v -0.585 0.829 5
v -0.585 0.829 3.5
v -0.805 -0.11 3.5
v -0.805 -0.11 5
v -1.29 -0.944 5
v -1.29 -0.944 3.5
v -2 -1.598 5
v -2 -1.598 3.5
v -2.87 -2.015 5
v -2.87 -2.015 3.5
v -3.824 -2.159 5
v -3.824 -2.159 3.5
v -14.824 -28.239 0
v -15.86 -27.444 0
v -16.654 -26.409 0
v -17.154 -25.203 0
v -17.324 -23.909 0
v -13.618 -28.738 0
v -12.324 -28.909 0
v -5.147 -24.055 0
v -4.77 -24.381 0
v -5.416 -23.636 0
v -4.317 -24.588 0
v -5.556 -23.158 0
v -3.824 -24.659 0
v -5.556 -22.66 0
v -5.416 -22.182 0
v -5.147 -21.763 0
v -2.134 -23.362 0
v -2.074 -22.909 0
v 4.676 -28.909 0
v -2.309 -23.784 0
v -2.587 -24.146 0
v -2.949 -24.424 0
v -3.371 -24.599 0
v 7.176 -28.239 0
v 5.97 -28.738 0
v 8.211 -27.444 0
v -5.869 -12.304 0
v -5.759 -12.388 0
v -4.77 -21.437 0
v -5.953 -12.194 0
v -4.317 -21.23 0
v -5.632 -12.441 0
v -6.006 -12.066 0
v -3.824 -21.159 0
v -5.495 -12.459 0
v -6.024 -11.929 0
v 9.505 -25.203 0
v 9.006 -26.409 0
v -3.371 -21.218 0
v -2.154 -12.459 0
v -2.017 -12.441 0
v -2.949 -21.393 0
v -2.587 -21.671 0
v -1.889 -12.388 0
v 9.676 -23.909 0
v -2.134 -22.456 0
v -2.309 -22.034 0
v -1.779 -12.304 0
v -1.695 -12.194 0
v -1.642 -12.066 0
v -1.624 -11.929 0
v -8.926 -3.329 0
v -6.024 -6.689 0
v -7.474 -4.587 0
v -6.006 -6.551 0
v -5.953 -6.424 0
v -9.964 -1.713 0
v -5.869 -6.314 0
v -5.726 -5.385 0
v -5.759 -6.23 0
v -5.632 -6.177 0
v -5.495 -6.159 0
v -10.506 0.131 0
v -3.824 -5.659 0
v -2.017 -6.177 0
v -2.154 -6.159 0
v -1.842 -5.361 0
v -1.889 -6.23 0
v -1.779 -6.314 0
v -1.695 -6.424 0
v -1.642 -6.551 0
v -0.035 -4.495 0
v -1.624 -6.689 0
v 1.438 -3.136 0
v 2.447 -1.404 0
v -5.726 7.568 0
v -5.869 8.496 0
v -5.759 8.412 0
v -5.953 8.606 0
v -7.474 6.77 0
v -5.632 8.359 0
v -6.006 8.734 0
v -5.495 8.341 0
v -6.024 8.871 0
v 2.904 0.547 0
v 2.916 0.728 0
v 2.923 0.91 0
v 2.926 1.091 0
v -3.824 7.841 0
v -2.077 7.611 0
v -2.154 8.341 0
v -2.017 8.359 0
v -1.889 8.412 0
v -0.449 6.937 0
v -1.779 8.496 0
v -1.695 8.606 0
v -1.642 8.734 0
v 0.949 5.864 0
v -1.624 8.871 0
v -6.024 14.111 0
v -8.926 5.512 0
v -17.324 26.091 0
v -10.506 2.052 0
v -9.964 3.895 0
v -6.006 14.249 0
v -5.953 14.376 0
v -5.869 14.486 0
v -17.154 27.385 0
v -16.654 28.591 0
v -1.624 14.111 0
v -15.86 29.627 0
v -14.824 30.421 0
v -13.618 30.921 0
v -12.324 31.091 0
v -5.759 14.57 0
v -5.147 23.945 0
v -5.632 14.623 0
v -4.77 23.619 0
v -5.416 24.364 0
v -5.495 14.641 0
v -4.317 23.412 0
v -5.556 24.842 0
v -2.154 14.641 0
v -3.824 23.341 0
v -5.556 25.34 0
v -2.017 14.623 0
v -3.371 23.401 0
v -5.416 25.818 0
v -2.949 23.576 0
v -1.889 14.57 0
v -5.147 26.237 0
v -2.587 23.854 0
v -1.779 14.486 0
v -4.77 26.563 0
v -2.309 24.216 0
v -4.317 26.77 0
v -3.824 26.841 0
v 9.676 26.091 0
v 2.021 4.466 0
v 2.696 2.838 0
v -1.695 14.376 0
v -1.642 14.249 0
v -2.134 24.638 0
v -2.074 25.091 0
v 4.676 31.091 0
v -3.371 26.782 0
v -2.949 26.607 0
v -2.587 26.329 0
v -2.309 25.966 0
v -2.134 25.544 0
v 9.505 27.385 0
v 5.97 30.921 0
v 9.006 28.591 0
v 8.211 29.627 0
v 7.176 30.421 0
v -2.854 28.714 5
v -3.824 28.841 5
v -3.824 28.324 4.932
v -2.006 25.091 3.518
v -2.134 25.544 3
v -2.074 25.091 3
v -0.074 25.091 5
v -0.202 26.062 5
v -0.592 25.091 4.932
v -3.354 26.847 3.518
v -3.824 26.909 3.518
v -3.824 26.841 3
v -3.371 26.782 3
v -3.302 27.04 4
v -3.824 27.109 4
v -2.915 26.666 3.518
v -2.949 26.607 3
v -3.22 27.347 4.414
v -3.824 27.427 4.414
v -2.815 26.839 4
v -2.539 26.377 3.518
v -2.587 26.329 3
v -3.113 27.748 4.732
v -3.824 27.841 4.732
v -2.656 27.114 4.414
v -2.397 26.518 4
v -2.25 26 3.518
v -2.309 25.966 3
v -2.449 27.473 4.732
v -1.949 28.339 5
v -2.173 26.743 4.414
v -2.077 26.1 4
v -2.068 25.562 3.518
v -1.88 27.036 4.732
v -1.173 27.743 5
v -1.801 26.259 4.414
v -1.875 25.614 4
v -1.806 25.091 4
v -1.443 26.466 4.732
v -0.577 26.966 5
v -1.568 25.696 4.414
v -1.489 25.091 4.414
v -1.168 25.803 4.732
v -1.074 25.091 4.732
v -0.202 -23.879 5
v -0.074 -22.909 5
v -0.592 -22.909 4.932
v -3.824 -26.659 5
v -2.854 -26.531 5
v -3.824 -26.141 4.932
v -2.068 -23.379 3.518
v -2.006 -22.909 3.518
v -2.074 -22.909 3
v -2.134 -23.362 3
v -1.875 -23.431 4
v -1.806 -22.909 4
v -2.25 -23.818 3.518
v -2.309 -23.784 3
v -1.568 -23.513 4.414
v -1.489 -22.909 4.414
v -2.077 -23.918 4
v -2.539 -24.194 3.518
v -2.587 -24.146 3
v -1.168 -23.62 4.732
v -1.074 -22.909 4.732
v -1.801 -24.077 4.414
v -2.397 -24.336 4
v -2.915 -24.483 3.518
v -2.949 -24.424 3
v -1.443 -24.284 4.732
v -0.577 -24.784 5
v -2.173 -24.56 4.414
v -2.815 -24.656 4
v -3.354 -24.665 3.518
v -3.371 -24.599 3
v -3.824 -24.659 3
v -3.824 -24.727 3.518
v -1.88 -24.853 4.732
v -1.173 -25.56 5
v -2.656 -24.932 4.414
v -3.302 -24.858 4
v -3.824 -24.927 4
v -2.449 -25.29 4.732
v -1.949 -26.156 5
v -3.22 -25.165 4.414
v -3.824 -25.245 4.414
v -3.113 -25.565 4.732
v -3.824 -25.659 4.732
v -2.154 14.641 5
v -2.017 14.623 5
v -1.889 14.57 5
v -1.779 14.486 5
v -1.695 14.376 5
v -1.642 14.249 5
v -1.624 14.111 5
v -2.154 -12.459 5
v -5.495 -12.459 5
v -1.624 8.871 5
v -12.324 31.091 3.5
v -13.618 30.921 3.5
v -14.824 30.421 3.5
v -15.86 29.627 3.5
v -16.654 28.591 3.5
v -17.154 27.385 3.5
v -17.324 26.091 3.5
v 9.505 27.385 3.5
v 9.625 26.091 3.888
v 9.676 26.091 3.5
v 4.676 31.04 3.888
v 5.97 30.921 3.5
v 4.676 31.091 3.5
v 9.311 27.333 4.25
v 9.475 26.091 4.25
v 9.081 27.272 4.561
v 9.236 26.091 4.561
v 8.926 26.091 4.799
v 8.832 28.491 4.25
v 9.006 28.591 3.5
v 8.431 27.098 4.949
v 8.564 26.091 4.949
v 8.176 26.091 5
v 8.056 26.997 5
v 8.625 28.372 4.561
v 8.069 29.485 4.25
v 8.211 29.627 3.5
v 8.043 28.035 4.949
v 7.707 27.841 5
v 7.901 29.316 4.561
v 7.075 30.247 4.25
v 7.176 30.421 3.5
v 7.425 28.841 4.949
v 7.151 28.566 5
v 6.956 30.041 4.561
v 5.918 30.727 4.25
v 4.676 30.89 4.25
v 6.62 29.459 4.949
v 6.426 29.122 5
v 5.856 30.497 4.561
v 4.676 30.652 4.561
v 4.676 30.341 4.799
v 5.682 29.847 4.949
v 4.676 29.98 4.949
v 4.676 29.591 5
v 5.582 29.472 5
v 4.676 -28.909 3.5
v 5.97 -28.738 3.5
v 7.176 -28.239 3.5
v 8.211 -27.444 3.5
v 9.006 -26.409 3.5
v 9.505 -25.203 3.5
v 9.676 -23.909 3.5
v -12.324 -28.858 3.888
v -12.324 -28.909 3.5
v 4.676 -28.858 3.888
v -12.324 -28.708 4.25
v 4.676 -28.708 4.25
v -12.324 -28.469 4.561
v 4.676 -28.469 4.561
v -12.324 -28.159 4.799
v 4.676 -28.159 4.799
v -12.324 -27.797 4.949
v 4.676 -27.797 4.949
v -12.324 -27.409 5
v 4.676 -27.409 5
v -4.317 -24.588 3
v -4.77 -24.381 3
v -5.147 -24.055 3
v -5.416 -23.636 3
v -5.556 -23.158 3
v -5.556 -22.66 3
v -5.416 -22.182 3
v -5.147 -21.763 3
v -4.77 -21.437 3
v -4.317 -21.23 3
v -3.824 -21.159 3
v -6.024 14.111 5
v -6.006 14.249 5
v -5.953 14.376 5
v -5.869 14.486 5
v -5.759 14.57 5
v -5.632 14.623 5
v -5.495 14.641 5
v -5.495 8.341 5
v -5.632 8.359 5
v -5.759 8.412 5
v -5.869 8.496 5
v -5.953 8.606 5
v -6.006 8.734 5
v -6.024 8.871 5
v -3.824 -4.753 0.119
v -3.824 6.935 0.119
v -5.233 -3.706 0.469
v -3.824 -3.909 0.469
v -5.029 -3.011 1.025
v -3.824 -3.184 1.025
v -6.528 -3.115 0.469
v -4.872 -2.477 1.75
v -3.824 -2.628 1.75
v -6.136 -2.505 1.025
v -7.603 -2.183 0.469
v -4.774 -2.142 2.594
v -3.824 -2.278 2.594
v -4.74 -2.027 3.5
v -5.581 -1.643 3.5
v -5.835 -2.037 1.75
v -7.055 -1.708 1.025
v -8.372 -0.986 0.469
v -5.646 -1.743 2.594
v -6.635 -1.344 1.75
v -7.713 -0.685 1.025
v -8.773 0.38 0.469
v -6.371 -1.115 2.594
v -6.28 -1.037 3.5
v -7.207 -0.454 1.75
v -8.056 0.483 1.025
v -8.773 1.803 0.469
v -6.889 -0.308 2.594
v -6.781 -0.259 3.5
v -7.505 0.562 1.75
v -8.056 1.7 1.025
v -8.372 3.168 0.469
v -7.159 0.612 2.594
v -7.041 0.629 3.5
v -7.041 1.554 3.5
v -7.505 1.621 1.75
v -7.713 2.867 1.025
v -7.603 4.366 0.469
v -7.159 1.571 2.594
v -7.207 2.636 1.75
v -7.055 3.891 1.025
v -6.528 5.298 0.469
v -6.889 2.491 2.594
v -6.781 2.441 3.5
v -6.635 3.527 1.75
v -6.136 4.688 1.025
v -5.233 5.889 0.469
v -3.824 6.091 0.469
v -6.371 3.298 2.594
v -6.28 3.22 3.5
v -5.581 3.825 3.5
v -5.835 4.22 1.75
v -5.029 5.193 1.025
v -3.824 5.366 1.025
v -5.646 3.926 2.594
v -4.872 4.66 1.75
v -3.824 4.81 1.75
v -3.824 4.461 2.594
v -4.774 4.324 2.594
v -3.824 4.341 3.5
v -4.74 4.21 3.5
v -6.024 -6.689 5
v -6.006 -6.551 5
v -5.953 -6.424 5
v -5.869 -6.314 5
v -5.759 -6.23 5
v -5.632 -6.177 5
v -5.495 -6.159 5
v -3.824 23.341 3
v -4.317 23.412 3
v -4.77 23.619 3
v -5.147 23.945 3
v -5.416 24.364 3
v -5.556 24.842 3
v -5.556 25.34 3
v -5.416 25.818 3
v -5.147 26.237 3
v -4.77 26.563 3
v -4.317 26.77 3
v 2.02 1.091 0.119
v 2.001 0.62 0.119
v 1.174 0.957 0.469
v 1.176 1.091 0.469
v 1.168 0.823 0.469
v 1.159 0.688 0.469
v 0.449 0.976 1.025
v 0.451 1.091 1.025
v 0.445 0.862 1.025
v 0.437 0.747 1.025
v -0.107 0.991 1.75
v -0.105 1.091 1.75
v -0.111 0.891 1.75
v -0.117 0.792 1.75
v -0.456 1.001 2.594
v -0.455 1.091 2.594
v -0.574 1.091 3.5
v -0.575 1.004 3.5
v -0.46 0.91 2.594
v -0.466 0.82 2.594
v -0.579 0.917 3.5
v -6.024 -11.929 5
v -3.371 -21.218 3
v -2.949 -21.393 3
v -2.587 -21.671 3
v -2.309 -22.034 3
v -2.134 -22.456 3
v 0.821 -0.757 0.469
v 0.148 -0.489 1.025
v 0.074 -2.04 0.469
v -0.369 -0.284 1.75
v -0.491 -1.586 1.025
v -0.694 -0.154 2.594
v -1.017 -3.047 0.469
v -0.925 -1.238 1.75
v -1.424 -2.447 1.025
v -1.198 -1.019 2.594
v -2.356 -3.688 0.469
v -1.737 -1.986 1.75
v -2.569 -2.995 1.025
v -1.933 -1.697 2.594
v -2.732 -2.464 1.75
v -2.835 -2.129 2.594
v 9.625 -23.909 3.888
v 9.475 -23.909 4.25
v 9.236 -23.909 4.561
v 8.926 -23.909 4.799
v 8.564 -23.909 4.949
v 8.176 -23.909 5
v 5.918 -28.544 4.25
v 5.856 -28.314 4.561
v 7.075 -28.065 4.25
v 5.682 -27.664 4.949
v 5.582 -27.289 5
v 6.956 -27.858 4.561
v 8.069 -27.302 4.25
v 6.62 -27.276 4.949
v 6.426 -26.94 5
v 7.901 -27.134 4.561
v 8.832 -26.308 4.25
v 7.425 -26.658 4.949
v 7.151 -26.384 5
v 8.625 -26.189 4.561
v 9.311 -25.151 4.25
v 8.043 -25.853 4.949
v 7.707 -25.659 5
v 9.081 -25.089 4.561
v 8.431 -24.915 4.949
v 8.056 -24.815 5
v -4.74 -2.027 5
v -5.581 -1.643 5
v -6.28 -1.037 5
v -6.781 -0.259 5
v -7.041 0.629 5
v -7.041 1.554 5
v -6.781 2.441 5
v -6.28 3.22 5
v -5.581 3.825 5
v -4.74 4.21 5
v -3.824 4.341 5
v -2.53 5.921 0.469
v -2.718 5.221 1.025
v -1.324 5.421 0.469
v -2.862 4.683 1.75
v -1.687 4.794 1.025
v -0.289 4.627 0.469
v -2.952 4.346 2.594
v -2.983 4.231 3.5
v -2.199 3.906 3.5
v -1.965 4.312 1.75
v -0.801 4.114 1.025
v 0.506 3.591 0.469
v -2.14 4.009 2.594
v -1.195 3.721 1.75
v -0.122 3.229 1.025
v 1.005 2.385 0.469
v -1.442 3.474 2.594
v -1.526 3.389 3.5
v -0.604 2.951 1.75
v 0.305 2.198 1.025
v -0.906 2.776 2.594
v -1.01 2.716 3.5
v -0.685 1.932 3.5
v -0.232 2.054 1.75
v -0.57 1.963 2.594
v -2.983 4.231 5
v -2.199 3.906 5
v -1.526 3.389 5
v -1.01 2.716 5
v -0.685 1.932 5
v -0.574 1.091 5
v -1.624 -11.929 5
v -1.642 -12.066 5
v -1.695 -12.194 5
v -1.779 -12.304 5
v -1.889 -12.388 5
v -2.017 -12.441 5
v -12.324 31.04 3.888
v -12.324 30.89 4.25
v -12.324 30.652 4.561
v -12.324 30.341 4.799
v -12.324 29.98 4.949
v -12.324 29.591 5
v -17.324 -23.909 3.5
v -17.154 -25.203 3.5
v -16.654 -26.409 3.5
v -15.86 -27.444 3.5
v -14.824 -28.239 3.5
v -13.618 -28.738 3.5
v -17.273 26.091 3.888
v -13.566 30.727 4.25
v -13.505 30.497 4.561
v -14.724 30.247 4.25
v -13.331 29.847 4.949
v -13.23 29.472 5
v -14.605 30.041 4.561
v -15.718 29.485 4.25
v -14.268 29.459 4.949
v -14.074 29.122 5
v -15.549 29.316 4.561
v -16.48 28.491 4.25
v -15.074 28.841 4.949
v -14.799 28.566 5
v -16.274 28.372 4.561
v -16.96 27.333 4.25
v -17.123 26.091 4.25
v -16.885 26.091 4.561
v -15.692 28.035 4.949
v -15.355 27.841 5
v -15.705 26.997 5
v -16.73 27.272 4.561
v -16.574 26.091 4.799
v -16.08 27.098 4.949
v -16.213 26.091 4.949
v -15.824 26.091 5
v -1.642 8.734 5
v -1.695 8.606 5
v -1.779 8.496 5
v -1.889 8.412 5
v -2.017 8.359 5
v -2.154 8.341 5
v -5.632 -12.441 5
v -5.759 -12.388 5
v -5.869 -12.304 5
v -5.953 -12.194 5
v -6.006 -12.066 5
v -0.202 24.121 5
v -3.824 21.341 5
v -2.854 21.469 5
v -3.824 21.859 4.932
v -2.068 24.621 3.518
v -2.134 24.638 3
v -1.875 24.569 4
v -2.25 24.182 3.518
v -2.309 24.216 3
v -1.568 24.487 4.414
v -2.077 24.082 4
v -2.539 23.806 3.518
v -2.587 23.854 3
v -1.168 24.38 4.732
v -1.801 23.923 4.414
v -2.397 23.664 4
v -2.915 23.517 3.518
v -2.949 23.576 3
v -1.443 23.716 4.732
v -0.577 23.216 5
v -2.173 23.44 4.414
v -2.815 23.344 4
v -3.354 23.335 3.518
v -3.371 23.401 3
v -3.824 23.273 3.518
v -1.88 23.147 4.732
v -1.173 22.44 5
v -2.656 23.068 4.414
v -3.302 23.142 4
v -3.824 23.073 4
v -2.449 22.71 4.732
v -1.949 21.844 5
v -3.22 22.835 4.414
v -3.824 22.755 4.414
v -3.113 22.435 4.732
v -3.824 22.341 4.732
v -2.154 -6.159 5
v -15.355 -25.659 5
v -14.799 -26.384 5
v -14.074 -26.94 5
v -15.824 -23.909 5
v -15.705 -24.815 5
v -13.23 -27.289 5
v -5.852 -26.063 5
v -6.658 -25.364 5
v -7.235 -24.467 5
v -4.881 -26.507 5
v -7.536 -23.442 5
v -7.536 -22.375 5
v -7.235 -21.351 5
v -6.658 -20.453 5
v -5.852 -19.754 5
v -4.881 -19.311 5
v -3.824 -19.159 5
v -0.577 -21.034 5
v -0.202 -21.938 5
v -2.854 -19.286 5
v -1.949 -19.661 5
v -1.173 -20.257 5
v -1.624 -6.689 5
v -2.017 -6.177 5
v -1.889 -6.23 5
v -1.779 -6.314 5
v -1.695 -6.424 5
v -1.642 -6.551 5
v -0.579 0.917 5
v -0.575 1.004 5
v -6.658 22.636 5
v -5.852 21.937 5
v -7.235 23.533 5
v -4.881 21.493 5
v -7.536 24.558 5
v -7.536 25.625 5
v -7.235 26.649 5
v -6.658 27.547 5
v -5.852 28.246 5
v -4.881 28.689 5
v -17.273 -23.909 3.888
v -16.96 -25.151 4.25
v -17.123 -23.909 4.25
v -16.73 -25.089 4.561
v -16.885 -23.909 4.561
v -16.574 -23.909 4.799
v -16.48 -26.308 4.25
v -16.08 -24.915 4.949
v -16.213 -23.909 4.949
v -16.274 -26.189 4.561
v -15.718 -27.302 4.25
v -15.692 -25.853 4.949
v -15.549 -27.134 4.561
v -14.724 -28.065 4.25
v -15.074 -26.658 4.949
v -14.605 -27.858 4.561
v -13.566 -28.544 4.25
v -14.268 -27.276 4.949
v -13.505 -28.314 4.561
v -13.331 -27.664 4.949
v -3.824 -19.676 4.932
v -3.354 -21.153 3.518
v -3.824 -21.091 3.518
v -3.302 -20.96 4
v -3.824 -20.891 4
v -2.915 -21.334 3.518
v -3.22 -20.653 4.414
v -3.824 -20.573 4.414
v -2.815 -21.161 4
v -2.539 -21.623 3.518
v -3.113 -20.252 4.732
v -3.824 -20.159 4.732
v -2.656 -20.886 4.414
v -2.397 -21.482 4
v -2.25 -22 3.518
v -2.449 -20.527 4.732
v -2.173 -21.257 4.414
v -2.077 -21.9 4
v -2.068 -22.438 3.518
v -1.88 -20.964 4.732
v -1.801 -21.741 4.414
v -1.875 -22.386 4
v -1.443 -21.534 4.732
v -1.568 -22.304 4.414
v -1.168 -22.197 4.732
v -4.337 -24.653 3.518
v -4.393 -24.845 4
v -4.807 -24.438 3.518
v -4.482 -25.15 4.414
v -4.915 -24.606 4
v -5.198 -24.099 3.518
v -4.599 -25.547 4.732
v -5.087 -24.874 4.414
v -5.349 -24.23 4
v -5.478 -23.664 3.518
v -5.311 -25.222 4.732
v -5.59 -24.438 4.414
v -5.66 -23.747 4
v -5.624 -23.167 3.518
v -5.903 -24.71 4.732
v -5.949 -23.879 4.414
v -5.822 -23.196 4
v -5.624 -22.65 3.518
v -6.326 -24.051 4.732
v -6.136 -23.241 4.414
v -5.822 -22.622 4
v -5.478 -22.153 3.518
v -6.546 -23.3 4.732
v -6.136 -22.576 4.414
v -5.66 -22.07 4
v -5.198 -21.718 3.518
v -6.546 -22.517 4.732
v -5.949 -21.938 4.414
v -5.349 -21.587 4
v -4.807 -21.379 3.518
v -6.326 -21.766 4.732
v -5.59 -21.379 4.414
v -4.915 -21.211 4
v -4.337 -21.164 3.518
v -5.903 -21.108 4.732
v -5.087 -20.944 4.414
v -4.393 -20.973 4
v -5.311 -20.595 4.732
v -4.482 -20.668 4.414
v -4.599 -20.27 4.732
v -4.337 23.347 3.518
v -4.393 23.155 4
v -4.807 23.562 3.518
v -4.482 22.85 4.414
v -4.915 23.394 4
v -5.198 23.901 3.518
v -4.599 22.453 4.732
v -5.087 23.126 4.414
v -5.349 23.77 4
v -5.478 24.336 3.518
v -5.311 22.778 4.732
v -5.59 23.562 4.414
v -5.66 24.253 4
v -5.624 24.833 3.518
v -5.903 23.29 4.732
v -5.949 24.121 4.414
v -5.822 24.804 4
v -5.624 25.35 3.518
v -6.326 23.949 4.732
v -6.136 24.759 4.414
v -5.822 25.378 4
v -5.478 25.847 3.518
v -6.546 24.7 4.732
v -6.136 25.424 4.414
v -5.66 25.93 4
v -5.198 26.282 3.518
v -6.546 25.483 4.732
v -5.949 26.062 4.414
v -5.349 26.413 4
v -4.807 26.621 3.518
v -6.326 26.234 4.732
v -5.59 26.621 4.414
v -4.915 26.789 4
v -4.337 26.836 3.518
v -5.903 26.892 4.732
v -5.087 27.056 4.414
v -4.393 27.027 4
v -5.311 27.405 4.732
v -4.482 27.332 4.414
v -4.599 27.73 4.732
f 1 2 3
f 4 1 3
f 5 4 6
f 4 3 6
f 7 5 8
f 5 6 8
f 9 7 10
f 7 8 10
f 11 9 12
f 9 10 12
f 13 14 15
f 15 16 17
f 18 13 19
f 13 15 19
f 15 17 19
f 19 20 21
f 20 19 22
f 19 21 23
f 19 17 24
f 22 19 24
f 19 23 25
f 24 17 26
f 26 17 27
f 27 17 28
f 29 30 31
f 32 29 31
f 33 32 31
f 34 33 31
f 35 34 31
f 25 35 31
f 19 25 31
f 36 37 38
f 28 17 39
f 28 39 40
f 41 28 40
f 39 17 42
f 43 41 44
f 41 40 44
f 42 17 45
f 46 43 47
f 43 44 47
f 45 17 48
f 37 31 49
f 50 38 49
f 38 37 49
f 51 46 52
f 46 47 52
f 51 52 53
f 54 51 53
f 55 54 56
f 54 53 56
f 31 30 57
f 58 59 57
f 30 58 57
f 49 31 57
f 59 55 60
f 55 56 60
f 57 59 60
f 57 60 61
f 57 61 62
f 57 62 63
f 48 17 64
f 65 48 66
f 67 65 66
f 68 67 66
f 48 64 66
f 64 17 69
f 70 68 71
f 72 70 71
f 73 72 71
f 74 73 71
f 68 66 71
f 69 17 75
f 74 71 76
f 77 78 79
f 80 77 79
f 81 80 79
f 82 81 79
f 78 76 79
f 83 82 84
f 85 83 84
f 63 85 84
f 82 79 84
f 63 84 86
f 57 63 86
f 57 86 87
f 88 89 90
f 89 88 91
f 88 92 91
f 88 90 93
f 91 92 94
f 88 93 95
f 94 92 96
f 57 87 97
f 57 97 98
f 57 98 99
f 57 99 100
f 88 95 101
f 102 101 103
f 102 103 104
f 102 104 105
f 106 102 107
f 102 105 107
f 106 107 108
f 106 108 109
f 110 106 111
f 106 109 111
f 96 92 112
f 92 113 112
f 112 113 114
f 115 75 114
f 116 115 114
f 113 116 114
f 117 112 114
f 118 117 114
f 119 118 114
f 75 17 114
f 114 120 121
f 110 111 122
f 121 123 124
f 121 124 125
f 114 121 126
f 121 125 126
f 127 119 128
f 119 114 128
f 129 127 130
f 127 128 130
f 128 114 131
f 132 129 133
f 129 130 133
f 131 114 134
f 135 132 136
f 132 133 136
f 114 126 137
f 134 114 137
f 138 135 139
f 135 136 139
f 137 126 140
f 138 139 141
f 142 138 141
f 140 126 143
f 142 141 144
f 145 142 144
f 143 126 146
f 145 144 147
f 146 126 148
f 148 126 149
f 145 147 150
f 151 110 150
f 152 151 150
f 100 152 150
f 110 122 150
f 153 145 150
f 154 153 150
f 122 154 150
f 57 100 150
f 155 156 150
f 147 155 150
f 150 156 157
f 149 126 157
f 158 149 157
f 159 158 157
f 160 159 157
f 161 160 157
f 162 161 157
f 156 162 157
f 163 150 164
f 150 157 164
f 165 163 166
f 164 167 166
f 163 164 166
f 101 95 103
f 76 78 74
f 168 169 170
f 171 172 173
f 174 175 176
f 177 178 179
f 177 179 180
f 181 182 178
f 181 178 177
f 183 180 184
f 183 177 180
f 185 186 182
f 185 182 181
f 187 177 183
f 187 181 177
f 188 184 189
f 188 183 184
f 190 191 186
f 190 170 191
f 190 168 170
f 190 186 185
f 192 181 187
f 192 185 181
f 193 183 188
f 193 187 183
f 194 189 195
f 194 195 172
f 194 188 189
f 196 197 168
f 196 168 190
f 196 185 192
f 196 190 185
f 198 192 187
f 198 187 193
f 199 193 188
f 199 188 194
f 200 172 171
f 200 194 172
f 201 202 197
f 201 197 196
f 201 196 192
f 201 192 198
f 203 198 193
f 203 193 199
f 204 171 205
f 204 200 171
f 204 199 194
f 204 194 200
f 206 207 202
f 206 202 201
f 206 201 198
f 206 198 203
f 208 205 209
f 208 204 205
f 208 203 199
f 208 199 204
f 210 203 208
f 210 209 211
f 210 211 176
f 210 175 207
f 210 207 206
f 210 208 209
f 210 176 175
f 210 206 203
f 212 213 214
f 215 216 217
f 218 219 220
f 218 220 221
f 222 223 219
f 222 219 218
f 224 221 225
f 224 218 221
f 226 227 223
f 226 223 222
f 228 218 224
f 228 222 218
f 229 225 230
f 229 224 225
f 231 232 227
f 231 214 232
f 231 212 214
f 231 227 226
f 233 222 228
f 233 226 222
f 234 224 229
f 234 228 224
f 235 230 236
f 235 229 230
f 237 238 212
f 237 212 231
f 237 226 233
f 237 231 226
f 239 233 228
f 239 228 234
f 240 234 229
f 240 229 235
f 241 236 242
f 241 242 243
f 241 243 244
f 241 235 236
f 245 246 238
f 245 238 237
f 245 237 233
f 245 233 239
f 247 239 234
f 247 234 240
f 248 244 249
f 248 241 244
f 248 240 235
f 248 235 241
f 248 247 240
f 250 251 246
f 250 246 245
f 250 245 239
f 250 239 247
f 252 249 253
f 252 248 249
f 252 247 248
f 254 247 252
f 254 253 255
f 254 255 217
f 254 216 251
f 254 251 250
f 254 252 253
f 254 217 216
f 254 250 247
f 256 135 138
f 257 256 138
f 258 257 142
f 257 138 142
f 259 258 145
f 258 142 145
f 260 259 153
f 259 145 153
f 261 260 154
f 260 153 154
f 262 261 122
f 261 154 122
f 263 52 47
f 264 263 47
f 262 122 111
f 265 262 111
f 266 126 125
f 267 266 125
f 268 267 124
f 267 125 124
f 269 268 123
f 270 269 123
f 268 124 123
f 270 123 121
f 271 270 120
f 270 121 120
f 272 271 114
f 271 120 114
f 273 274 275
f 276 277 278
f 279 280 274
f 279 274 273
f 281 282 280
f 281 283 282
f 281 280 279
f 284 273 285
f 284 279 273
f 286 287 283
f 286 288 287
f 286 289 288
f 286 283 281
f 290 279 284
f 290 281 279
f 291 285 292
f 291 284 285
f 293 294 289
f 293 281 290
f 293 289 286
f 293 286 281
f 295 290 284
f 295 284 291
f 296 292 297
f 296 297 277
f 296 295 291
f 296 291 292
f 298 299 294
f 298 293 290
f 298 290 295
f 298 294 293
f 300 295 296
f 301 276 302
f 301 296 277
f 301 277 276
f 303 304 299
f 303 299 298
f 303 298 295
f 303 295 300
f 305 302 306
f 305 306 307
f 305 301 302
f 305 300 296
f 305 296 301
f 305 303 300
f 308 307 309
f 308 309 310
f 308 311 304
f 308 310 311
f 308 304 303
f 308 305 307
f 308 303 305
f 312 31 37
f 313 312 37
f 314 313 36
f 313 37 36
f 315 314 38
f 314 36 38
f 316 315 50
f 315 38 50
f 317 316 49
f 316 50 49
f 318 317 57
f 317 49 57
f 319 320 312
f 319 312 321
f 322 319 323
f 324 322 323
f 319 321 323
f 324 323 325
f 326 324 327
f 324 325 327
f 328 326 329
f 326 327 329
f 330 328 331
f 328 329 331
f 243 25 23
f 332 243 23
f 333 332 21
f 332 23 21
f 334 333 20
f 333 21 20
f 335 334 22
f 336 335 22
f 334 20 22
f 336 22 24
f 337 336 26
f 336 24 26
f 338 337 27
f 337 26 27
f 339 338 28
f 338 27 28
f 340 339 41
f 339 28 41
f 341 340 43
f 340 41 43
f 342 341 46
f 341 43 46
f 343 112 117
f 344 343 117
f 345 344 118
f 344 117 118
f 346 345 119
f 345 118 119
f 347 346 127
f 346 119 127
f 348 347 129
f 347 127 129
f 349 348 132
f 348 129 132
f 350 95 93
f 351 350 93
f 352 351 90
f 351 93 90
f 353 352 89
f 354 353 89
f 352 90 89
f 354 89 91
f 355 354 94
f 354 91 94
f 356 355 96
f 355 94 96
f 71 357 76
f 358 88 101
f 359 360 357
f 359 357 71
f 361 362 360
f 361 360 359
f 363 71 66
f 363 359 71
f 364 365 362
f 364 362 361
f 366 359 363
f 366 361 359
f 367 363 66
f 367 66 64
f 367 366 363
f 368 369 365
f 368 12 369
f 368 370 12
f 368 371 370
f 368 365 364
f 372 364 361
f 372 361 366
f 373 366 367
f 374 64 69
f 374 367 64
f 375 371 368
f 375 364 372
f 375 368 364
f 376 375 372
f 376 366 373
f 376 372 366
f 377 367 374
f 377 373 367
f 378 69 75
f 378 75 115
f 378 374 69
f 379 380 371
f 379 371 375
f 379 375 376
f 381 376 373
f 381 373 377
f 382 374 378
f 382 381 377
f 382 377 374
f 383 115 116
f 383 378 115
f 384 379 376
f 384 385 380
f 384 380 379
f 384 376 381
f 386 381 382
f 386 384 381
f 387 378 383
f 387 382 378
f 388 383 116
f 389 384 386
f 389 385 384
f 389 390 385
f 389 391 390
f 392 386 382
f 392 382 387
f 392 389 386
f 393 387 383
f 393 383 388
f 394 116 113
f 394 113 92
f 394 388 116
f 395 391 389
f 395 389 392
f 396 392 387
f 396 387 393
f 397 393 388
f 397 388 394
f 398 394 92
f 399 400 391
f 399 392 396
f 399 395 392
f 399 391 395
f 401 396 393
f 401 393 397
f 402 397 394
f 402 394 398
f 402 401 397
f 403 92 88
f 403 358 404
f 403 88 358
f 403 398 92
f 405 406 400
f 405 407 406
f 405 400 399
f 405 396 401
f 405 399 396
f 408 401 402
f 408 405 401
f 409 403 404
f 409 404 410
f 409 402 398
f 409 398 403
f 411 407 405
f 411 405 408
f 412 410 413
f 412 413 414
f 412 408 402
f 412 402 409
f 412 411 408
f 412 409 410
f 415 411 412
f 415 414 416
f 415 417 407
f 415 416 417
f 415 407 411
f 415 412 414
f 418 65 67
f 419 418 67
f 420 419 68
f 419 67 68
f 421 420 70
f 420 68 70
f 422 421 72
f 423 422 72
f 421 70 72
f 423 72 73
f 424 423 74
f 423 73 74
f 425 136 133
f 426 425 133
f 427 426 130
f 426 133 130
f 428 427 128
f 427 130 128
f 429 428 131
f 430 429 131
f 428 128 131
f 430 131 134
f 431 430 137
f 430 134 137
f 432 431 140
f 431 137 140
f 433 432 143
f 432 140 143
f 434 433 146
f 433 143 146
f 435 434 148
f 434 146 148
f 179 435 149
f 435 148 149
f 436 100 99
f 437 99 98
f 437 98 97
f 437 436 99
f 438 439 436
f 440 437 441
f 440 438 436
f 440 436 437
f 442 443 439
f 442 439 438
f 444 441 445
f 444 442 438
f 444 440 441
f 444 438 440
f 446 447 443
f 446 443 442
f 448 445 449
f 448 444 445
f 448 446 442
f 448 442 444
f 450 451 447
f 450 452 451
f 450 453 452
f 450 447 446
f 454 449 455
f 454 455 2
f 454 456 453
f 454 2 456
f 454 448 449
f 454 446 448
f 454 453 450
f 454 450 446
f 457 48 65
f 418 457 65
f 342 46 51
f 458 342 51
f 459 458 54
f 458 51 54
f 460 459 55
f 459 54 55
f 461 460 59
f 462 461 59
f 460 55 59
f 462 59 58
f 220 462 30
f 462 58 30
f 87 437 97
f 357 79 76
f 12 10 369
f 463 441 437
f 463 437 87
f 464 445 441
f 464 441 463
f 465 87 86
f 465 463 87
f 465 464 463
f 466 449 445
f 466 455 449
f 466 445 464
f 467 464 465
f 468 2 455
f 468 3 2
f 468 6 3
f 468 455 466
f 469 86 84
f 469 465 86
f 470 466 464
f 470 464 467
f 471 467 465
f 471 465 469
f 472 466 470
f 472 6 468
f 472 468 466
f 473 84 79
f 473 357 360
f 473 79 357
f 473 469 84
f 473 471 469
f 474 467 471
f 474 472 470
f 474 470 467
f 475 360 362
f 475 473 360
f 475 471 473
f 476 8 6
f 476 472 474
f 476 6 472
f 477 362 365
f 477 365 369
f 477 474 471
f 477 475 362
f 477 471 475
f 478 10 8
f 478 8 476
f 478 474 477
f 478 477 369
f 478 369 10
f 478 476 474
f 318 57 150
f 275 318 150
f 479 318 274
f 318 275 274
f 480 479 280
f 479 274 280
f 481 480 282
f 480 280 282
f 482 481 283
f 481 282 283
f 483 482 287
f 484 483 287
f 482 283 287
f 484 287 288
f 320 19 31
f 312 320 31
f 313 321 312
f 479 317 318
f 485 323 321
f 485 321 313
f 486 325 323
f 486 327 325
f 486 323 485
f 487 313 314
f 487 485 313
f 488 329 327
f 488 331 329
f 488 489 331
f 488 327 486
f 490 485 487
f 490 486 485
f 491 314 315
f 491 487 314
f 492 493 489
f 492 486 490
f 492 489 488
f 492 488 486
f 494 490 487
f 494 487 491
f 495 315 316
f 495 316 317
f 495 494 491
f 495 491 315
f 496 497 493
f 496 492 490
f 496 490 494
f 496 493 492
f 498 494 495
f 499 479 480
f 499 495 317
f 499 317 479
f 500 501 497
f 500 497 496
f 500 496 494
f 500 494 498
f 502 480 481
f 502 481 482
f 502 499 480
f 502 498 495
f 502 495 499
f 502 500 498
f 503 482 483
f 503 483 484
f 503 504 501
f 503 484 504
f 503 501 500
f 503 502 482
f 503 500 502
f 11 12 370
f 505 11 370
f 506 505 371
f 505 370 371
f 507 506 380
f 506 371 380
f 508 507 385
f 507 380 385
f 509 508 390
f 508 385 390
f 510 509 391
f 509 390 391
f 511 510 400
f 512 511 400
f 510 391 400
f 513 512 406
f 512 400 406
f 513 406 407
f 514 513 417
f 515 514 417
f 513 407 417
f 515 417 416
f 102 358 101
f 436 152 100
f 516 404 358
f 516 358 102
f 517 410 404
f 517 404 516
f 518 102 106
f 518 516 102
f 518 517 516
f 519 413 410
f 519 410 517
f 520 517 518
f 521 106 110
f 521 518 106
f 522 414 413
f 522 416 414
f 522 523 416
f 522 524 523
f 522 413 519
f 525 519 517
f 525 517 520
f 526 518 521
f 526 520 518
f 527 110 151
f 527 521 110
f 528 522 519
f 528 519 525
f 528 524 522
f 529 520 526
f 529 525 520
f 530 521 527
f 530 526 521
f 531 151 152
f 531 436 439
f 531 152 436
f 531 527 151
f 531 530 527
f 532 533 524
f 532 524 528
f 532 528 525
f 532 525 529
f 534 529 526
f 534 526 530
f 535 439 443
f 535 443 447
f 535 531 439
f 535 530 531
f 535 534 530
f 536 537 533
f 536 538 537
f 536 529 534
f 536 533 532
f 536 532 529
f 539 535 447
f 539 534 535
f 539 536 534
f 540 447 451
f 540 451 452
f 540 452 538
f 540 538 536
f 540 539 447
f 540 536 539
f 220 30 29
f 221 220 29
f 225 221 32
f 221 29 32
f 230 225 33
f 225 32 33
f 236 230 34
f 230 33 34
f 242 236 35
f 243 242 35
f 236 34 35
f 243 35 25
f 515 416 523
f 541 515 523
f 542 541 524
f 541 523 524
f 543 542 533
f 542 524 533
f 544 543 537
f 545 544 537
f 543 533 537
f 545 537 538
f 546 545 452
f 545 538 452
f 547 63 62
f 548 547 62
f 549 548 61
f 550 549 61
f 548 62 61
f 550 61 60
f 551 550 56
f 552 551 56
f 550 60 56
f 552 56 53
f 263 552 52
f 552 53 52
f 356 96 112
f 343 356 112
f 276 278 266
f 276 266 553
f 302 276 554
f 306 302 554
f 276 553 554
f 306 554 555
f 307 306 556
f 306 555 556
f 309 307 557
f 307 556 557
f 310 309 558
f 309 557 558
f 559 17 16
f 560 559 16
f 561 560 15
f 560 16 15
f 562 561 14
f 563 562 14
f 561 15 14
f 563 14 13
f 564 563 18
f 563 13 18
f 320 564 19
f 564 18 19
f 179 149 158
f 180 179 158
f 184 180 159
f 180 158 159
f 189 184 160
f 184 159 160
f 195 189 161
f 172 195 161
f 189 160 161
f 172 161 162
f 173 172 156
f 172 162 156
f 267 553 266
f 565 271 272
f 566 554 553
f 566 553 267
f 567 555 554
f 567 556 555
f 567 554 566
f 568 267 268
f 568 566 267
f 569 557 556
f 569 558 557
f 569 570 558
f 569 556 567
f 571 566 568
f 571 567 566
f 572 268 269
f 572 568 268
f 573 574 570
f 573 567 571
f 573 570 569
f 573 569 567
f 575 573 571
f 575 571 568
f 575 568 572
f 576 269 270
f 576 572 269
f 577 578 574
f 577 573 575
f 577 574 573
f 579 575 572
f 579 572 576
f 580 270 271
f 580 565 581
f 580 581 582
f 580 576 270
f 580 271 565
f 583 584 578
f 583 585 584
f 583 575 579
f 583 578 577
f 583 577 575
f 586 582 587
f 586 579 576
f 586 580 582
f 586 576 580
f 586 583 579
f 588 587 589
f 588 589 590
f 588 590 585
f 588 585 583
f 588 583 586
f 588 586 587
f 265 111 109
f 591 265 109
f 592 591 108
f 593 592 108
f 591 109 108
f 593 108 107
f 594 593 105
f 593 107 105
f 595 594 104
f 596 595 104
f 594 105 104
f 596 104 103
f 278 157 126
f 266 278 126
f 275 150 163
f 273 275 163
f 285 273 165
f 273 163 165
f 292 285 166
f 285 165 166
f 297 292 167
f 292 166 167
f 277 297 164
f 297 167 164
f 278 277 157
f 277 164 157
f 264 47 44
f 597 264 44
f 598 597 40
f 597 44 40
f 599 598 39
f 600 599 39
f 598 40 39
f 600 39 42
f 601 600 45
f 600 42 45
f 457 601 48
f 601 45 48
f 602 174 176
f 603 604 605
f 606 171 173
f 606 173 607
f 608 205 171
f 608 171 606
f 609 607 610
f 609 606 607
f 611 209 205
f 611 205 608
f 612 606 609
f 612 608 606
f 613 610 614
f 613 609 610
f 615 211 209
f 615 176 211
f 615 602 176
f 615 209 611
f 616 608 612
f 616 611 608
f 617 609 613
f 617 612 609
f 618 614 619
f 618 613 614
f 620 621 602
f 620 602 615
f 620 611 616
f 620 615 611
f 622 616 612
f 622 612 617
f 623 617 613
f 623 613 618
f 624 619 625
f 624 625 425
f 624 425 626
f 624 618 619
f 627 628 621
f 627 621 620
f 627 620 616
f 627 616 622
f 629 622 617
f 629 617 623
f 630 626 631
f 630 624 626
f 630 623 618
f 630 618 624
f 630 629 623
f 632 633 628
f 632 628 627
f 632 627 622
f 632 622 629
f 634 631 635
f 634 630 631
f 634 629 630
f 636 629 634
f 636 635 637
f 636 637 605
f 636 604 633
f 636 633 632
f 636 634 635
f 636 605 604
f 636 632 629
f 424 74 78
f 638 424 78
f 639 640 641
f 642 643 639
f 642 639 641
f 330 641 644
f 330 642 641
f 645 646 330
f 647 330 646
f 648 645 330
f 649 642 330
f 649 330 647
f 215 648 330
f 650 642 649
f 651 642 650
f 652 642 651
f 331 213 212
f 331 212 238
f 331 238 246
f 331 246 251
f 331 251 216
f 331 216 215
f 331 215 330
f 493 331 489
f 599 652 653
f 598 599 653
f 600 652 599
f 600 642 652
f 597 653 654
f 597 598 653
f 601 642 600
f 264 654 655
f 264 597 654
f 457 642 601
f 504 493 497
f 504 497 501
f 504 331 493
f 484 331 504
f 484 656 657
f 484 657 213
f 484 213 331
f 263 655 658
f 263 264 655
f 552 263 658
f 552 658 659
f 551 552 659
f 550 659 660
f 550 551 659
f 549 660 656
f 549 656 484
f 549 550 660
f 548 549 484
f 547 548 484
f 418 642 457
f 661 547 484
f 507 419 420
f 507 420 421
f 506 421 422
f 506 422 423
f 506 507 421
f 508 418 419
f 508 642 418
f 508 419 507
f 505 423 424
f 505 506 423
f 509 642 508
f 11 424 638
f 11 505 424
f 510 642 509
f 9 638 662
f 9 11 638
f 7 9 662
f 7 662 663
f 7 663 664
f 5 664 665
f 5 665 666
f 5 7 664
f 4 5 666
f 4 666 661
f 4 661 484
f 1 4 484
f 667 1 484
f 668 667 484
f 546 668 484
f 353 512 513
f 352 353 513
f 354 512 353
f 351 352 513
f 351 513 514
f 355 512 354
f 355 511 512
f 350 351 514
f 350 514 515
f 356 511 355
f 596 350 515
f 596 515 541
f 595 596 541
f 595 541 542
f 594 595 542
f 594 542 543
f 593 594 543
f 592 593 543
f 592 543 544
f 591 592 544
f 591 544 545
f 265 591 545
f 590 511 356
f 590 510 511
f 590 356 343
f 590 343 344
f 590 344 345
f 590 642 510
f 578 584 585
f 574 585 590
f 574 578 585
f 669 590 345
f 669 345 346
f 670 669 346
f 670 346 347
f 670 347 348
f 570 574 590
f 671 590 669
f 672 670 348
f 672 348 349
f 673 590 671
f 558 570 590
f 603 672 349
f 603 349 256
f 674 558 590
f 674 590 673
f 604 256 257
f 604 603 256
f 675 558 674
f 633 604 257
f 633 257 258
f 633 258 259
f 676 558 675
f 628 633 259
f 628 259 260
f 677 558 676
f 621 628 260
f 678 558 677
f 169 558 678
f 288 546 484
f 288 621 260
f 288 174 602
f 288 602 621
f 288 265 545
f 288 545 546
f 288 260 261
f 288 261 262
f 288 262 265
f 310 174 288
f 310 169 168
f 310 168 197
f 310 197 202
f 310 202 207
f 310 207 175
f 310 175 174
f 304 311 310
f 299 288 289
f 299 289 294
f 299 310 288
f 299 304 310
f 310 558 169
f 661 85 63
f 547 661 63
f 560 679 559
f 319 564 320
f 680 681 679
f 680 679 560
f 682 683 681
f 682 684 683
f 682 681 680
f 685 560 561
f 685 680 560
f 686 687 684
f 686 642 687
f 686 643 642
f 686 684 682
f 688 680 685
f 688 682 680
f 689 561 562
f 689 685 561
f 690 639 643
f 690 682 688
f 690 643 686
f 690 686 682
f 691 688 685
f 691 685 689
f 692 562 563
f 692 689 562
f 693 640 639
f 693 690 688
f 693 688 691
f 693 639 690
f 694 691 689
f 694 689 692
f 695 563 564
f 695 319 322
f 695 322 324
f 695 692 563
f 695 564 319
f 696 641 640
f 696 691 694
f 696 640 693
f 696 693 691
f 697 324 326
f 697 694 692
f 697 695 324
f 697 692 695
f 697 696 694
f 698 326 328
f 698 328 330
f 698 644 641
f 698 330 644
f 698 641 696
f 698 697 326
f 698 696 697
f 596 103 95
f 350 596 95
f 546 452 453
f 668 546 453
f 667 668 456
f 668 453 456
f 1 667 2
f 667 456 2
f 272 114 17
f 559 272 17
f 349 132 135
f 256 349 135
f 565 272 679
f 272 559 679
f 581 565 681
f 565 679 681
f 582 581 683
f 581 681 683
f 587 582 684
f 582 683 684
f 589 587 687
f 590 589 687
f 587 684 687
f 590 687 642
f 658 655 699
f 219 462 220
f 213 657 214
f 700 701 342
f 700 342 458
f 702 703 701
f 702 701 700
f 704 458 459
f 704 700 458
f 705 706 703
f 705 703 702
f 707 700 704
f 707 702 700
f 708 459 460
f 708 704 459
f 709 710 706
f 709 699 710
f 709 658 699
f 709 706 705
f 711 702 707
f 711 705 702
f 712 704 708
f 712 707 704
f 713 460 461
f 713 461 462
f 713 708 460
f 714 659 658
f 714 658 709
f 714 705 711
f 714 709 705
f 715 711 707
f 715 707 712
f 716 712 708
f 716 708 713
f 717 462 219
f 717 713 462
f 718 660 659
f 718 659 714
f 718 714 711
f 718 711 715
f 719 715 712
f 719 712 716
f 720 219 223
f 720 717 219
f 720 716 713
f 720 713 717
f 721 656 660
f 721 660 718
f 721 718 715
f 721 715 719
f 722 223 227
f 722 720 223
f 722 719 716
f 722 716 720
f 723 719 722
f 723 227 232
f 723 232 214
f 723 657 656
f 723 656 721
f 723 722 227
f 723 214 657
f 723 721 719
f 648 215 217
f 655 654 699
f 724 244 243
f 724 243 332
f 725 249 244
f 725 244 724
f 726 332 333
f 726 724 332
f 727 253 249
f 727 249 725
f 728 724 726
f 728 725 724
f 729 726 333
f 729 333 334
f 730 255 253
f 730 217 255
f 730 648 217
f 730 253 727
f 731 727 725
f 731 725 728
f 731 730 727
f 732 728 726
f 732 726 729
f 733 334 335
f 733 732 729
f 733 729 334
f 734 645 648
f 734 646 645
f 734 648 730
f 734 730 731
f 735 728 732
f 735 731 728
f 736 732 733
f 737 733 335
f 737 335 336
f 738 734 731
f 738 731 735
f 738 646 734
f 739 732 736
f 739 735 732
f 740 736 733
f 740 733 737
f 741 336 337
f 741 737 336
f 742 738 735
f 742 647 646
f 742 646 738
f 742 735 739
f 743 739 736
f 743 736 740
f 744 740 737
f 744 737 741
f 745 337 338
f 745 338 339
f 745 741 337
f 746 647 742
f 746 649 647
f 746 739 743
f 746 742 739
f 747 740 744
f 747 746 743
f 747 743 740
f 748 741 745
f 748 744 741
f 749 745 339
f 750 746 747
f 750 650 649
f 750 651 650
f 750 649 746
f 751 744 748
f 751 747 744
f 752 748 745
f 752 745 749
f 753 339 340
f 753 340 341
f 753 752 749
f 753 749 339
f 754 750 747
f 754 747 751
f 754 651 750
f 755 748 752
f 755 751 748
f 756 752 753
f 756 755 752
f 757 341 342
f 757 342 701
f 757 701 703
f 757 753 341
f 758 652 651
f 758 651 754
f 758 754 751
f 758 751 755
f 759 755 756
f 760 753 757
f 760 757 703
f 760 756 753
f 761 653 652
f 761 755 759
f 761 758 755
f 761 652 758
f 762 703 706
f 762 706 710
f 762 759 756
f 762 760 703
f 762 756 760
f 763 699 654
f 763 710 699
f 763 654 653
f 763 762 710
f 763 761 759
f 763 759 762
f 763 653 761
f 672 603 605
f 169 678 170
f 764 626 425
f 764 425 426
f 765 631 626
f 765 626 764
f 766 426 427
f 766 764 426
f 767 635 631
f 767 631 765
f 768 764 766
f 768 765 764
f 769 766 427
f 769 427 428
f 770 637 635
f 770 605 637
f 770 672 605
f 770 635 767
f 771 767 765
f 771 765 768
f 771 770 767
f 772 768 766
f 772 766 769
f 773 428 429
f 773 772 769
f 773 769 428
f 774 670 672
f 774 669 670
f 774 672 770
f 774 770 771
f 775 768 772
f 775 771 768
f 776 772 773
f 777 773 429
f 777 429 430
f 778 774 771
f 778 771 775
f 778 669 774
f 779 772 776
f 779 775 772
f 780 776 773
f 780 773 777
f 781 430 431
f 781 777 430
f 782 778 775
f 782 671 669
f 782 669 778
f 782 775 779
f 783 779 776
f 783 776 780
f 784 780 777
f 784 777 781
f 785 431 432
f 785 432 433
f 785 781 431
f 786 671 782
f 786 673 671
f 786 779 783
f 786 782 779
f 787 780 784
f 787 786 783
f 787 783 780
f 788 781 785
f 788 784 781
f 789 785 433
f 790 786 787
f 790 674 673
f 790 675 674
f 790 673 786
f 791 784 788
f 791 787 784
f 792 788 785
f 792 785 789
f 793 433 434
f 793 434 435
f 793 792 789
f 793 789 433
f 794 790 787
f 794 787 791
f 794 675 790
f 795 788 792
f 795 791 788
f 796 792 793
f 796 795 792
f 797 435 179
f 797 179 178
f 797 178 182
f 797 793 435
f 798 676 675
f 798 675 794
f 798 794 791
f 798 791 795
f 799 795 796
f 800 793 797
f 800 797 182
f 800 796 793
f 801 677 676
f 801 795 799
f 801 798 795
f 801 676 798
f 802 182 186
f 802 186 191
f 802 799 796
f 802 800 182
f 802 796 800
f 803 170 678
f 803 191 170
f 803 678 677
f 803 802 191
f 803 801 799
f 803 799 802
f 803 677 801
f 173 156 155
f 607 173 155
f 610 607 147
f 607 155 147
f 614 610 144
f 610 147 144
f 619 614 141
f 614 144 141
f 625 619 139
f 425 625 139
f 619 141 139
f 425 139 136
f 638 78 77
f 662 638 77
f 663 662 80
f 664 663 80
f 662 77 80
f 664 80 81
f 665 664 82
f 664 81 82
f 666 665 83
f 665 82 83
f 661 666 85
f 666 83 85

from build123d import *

# Parameters (mm, degrees)
F1_DEPTH = 5
F2_R     = 2
F3_R     = 3.5
F4_R     = 1.5


with BuildPart() as f1:
    # F0 (on Top) → F1 (new body)
    with BuildSketch(Plane.XY):
        with BuildLine():
            Line((-17.3243107274, 26.09127976), (-17.3243107274, -23.90872024))
            ThreePointArc((-17.3243107274, -23.90872024), (-15.8598446334, -27.4442541459), (-12.3243107274, -28.90872024))
            Line((-12.3243107274, -28.90872024), (-3.8243107274, -28.90872024))
            Line((-3.8243107274, -28.90872024), (-3.8243107274, -24.65872024))
            ThreePointArc((-3.8243107274, -24.65872024), (-5.5743107274, -22.90872024), (-3.8243107274, -21.15872024))
            Line((-3.8243107274, -21.15872024), (-3.8243107274, -12.45872024))
            Line((-3.8243107274, -12.45872024), (-5.4945183623, -12.45872024))
            ThreePointArc((-5.4945183623, -12.45872024), (-5.8691381363, -12.3035476489), (-6.0243107274, -11.9289278748))
            Line((-6.0243107274, -11.9289278748), (-6.0243107274, -6.6885126051))
            ThreePointArc((-6.0243107274, -6.6885126051), (-5.8691381363, -6.3138928311), (-5.4945183623, -6.15872024))
            Line((-5.4945183623, -6.15872024), (-3.8243107274, -6.15872024))
            Line((-3.8243107274, -6.15872024), (-3.8243107274, -2.15872024))
            ThreePointArc((-3.8243107274, -2.15872024), (-7.0743107274, 1.09127976), (-3.8243107274, 4.34127976))
            Line((-3.8243107274, 4.34127976), (-3.8243107274, 8.34127976))
            Line((-3.8243107274, 8.34127976), (-5.4945183623, 8.34127976))
            ThreePointArc((-5.4945183623, 8.34127976), (-5.8691381363, 8.4964523511), (-6.0243107274, 8.8710721252))
            Line((-6.0243107274, 8.8710721252), (-6.0243107274, 14.1114873949))
            ThreePointArc((-6.0243107274, 14.1114873949), (-5.8691381363, 14.4861071689), (-5.4945183623, 14.64127976))
            Line((-5.4945183623, 14.64127976), (-3.8243107274, 14.64127976))
            Line((-3.8243107274, 14.64127976), (-3.8243107274, 23.34127976))
            ThreePointArc((-3.8243107274, 23.34127976), (-5.5743107274, 25.09127976), (-3.8243107274, 26.84127976))
            Line((-3.8243107274, 26.84127976), (-3.8243107274, 31.09127976))
            Line((-3.8243107274, 31.09127976), (-12.3243107274, 31.09127976))
            ThreePointArc((-12.3243107274, 31.09127976), (-15.8598446334, 29.6268136659), (-17.3243107274, 26.09127976))
        make_face()
        with BuildLine():
            Line((-3.8243107274, -24.65872024), (-3.8243107274, -28.90872024))
            Line((-3.8243107274, -28.90872024), (4.6756892726, -28.90872024))
            ThreePointArc((4.6756892726, -28.90872024), (8.2112231785, -27.4442541459), (9.6756892726, -23.90872024))
            Line((9.6756892726, -23.90872024), (9.6756892726, 0))
            Line((9.6756892726, 0), (-0.584877345, 0.8294184204))
            ThreePointArc((-0.584877345, 0.8294184204), (-1.6207396886, -1.2976058959), (-3.8243107274, -2.15872024))
            Line((-3.8243107274, -2.15872024), (-3.8243107274, -6.15872024))
            Line((-3.8243107274, -6.15872024), (-2.1541030926, -6.15872024))
            ThreePointArc((-2.1541030926, -6.15872024), (-1.7794833185, -6.3138928311), (-1.6243107274, -6.6885126051))
            Line((-1.6243107274, -6.6885126051), (-1.6243107274, -11.9289278748))
            ThreePointArc((-1.6243107274, -11.9289278748), (-1.7794833185, -12.3035476489), (-2.1541030926, -12.45872024))
            Line((-2.1541030926, -12.45872024), (-3.8243107274, -12.45872024))
            Line((-3.8243107274, -12.45872024), (-3.8243107274, -21.15872024))
            ThreePointArc((-3.8243107274, -21.15872024), (-2.5868738603, -21.6712833729), (-2.0743107274, -22.90872024))
            ThreePointArc((-2.0743107274, -22.90872024), (-2.5868738603, -24.1461571071), (-3.8243107274, -24.65872024))
        make_face()
        with BuildLine():
            Line((4.6756892726, 31.09127976), (-3.8243107274, 31.09127976))
            Line((-3.8243107274, 31.09127976), (-3.8243107274, 26.84127976))
            ThreePointArc((-3.8243107274, 26.84127976), (-2.5868738603, 26.3287166271), (-2.0743107274, 25.09127976))
            ThreePointArc((-2.0743107274, 25.09127976), (-2.5868738603, 23.8538428929), (-3.8243107274, 23.34127976))
            Line((-3.8243107274, 23.34127976), (-3.8243107274, 14.64127976))
            Line((-3.8243107274, 14.64127976), (-2.1541030926, 14.64127976))
            ThreePointArc((-2.1541030926, 14.64127976), (-1.7794833185, 14.4861071689), (-1.6243107274, 14.1114873949))
            Line((-1.6243107274, 14.1114873949), (-1.6243107274, 8.8710721252))
            ThreePointArc((-1.6243107274, 8.8710721252), (-1.7794833185, 8.4964523511), (-2.1541030926, 8.34127976))
            Line((-2.1541030926, 8.34127976), (-3.8243107274, 8.34127976))
            Line((-3.8243107274, 8.34127976), (-3.8243107274, 4.34127976))
            ThreePointArc((-3.8243107274, 4.34127976), (-1.5262136886, 3.3893767989), (-0.5743107274, 1.09127976))
            ThreePointArc((-0.5743107274, 1.09127976), (-0.5769534563, 0.9602425377), (-0.584877345, 0.8294184204))
            Line((-0.584877345, 0.8294184204), (9.6756892726, 0))
            Line((9.6756892726, 0), (9.6756892726, 26.09127976))
            ThreePointArc((9.6756892726, 26.09127976), (8.2112231785, 29.6268136659), (4.6756892726, 31.09127976))
        make_face()
    extrude(amount=F1_DEPTH)

    # F2
    f2_edges = [f1.edges().sort_by_distance(p)[0] for p in [
        (-3.824311, -24.65872, 5),
        (-3.824311, 23.34128, 5),
    ]]
    fillet(f2_edges, radius=F2_R)

    # F3
    f3_edges = [f1.edges().sort_by_distance(p)[0] for p in [
        (-3.824311, -2.15872, 0),
    ]]
    fillet(f3_edges, radius=F3_R)

    # F4
    f4_edges = [f1.edges().sort_by_distance(p)[0] for p in [
        (-17.324311, 1.09128, 5),
    ]]
    fillet(f4_edges, radius=F4_R)


solid = f1.part
